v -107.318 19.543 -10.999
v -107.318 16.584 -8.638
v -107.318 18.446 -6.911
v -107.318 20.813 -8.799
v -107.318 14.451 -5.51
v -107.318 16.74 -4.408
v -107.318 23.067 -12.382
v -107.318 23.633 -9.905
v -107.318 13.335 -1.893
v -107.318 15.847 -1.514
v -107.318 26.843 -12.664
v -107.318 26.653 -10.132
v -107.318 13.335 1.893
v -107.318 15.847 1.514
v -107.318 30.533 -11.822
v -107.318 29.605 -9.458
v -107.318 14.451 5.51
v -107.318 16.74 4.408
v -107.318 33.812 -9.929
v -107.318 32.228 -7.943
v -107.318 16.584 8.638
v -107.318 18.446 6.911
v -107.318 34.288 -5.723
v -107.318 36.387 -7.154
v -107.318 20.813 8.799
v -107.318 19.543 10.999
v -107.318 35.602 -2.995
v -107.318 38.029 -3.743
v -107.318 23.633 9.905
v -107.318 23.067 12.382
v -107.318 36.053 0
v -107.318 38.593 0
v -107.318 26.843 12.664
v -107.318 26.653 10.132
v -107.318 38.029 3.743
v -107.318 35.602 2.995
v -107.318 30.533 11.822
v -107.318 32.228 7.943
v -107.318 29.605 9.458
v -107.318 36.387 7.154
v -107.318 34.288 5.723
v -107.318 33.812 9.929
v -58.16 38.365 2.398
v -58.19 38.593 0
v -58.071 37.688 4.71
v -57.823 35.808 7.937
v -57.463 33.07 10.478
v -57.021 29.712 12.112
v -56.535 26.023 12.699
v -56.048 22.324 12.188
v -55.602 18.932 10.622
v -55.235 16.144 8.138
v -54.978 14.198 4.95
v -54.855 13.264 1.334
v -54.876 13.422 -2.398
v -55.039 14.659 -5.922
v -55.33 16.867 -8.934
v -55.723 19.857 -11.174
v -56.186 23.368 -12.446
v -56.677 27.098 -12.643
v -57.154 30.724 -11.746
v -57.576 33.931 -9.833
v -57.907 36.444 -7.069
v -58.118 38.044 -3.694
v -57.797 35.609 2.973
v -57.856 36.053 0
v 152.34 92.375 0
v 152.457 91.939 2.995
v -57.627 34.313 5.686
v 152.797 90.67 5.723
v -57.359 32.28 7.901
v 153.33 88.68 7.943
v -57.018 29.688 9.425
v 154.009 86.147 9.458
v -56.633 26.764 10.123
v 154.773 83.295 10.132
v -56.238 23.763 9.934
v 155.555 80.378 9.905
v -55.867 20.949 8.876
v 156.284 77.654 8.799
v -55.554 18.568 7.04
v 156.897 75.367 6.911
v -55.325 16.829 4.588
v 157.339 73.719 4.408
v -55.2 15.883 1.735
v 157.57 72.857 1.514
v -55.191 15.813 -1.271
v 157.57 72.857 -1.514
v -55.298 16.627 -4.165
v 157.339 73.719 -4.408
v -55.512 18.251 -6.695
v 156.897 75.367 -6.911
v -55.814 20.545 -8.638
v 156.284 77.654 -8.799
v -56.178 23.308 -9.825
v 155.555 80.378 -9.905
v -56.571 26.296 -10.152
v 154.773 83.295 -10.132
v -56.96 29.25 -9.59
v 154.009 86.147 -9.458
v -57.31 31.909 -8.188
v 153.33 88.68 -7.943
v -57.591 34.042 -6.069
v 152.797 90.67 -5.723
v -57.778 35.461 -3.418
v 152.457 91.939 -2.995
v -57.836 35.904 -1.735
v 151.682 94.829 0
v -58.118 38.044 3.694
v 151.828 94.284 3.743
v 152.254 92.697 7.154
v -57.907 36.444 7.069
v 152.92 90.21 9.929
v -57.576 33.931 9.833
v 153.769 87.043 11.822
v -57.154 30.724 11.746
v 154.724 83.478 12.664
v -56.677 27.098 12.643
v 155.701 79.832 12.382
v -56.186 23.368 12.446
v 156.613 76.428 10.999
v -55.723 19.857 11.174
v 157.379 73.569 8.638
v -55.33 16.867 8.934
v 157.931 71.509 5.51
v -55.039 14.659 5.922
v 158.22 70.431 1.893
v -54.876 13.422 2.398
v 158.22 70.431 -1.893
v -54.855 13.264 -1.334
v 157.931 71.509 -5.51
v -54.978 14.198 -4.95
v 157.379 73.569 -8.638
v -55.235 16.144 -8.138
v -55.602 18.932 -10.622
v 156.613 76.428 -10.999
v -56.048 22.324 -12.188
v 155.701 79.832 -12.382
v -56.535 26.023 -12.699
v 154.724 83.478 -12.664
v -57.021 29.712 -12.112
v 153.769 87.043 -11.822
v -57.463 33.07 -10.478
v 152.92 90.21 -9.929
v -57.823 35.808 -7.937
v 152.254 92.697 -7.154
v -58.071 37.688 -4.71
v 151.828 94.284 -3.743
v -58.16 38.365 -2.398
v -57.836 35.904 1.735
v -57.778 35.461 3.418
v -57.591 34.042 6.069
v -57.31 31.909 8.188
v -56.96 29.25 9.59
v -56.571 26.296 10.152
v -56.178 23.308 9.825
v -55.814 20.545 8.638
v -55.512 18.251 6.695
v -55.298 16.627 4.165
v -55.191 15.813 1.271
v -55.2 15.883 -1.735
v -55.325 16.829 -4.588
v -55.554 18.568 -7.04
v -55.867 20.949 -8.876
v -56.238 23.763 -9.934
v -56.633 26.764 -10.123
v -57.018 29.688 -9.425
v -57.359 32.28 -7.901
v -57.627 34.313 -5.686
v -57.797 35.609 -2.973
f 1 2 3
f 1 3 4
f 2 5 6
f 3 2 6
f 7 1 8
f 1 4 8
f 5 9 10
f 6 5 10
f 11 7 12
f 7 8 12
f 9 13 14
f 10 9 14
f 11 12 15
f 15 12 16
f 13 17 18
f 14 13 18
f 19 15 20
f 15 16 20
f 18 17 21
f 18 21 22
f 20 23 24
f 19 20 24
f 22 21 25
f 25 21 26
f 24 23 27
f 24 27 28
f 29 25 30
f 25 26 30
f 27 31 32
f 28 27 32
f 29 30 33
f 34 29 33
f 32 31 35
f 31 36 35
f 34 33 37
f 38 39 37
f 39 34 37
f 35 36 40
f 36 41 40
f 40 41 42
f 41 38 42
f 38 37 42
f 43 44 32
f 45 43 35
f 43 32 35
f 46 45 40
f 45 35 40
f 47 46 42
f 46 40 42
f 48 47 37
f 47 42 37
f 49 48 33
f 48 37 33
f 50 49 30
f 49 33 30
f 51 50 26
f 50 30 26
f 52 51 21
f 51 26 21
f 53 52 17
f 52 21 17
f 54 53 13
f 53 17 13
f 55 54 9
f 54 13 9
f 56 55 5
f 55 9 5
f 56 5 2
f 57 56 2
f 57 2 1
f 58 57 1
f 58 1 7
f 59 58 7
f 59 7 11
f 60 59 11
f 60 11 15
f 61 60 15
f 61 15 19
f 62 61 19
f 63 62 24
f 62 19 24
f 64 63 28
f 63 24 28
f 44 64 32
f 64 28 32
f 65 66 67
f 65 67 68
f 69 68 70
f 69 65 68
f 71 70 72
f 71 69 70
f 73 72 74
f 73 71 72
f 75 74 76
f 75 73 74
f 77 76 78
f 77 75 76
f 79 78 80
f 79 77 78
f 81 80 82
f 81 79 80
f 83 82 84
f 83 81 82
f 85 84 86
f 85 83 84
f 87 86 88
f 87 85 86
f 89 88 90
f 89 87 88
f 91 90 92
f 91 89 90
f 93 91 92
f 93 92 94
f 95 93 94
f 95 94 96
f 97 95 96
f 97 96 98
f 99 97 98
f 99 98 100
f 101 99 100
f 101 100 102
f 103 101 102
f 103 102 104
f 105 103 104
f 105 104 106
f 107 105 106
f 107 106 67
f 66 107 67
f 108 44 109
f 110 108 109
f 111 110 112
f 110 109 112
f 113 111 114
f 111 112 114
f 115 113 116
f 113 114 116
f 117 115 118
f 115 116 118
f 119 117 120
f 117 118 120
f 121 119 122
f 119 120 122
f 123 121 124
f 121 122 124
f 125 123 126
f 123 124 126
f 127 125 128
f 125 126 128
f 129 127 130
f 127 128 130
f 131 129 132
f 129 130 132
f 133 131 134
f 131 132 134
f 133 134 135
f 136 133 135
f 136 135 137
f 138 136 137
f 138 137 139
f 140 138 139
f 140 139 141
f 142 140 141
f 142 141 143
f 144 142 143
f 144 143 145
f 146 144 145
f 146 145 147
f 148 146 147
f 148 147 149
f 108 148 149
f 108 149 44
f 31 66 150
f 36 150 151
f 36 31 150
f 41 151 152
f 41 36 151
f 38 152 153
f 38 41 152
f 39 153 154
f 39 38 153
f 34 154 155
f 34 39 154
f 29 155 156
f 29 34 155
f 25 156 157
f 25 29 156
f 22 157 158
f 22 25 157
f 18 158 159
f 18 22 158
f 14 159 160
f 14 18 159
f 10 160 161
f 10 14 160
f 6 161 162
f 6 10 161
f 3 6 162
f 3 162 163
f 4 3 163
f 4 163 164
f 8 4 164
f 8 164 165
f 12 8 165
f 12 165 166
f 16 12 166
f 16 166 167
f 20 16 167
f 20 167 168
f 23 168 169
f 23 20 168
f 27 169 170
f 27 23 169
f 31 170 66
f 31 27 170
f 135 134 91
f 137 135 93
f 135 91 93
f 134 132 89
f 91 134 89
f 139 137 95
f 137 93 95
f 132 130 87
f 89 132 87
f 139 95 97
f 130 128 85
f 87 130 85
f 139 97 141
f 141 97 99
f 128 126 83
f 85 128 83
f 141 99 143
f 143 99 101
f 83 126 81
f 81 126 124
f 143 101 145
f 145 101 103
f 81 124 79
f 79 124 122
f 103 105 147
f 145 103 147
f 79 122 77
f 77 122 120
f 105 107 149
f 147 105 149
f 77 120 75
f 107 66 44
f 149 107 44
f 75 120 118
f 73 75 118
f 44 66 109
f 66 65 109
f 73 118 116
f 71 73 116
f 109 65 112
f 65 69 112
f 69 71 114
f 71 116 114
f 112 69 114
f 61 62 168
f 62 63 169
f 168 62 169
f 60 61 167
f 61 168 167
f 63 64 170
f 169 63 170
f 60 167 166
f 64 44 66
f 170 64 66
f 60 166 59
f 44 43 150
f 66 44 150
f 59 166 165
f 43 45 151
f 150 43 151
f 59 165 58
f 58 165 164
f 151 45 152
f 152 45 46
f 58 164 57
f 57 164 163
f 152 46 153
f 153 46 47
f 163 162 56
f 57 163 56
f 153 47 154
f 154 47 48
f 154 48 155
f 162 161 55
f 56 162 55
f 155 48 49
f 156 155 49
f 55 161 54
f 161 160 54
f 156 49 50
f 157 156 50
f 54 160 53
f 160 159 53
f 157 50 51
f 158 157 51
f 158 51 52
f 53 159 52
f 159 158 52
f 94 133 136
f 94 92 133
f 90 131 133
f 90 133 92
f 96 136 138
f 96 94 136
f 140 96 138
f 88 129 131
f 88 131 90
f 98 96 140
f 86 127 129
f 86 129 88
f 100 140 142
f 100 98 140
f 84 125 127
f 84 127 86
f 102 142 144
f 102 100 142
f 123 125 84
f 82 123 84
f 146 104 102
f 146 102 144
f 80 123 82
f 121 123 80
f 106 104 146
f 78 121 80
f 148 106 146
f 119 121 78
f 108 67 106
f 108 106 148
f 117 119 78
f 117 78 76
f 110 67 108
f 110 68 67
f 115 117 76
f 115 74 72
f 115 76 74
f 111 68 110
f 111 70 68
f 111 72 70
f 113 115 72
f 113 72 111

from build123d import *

# Parameters (mm, degrees)
SKETCH1_R                = 12.7
SKETCH1_R_2              = 10.16
TUBING_TUBING_1_DEPTH    = 54.164546295
SKETCH1_ON_SEGMENT_2_R   = 12.7
SKETCH1_ON_SEGMENT_2_R_2 = 10.16
TUBING_TUBING_1_2_DEPTH  = 222.312546295


with BuildPart() as part:
    # Sketch1 → Tubing TUBING(1) (new body)
    with BuildSketch(Plane(origin=(-107.318138062, 25.893490854, 0), x_dir=(0, 1, 0), z_dir=(1, 0, 0))):
        Circle(SKETCH1_R)
        Circle(SKETCH1_R_2, mode=Mode.SUBTRACT)
    extrude(amount=TUBING_TUBING_1_DEPTH)

    # Tubing TUBING(1) mitre 1
    split(bisect_by=Plane(origin=(-56.518138062, 25.893490854, 0), x_dir=(0.130526192, -0.991444861, 0), z_dir=(-0.991444861, -0.130526192, 0)), keep=Keep.TOP)


with BuildPart() as body_2:
    # Sketch1 on segment 2 (carried to segment 2) → Tubing TUBING_1 2 (new body)
    with BuildSketch(Plane(origin=(-59.768040222, 25.022682195, 0), x_dir=(-0.258819045, 0.965925826, 0), z_dir=(0.965925826, 0.258819045, 0))):
        Circle(SKETCH1_ON_SEGMENT_2_R)
        Circle(SKETCH1_ON_SEGMENT_2_R_2, mode=Mode.SUBTRACT)
    extrude(amount=TUBING_TUBING_1_2_DEPTH)

    # Tubing TUBING_1 2 mitre 1
    split(bisect_by=Plane(origin=(-56.518138062, 25.893490854, 0), x_dir=(-0.130526192, 0.991444861, 0), z_dir=(0.991444861, 0.130526192, 0)), keep=Keep.TOP)


solid = Compound([part.part, body_2.part])
